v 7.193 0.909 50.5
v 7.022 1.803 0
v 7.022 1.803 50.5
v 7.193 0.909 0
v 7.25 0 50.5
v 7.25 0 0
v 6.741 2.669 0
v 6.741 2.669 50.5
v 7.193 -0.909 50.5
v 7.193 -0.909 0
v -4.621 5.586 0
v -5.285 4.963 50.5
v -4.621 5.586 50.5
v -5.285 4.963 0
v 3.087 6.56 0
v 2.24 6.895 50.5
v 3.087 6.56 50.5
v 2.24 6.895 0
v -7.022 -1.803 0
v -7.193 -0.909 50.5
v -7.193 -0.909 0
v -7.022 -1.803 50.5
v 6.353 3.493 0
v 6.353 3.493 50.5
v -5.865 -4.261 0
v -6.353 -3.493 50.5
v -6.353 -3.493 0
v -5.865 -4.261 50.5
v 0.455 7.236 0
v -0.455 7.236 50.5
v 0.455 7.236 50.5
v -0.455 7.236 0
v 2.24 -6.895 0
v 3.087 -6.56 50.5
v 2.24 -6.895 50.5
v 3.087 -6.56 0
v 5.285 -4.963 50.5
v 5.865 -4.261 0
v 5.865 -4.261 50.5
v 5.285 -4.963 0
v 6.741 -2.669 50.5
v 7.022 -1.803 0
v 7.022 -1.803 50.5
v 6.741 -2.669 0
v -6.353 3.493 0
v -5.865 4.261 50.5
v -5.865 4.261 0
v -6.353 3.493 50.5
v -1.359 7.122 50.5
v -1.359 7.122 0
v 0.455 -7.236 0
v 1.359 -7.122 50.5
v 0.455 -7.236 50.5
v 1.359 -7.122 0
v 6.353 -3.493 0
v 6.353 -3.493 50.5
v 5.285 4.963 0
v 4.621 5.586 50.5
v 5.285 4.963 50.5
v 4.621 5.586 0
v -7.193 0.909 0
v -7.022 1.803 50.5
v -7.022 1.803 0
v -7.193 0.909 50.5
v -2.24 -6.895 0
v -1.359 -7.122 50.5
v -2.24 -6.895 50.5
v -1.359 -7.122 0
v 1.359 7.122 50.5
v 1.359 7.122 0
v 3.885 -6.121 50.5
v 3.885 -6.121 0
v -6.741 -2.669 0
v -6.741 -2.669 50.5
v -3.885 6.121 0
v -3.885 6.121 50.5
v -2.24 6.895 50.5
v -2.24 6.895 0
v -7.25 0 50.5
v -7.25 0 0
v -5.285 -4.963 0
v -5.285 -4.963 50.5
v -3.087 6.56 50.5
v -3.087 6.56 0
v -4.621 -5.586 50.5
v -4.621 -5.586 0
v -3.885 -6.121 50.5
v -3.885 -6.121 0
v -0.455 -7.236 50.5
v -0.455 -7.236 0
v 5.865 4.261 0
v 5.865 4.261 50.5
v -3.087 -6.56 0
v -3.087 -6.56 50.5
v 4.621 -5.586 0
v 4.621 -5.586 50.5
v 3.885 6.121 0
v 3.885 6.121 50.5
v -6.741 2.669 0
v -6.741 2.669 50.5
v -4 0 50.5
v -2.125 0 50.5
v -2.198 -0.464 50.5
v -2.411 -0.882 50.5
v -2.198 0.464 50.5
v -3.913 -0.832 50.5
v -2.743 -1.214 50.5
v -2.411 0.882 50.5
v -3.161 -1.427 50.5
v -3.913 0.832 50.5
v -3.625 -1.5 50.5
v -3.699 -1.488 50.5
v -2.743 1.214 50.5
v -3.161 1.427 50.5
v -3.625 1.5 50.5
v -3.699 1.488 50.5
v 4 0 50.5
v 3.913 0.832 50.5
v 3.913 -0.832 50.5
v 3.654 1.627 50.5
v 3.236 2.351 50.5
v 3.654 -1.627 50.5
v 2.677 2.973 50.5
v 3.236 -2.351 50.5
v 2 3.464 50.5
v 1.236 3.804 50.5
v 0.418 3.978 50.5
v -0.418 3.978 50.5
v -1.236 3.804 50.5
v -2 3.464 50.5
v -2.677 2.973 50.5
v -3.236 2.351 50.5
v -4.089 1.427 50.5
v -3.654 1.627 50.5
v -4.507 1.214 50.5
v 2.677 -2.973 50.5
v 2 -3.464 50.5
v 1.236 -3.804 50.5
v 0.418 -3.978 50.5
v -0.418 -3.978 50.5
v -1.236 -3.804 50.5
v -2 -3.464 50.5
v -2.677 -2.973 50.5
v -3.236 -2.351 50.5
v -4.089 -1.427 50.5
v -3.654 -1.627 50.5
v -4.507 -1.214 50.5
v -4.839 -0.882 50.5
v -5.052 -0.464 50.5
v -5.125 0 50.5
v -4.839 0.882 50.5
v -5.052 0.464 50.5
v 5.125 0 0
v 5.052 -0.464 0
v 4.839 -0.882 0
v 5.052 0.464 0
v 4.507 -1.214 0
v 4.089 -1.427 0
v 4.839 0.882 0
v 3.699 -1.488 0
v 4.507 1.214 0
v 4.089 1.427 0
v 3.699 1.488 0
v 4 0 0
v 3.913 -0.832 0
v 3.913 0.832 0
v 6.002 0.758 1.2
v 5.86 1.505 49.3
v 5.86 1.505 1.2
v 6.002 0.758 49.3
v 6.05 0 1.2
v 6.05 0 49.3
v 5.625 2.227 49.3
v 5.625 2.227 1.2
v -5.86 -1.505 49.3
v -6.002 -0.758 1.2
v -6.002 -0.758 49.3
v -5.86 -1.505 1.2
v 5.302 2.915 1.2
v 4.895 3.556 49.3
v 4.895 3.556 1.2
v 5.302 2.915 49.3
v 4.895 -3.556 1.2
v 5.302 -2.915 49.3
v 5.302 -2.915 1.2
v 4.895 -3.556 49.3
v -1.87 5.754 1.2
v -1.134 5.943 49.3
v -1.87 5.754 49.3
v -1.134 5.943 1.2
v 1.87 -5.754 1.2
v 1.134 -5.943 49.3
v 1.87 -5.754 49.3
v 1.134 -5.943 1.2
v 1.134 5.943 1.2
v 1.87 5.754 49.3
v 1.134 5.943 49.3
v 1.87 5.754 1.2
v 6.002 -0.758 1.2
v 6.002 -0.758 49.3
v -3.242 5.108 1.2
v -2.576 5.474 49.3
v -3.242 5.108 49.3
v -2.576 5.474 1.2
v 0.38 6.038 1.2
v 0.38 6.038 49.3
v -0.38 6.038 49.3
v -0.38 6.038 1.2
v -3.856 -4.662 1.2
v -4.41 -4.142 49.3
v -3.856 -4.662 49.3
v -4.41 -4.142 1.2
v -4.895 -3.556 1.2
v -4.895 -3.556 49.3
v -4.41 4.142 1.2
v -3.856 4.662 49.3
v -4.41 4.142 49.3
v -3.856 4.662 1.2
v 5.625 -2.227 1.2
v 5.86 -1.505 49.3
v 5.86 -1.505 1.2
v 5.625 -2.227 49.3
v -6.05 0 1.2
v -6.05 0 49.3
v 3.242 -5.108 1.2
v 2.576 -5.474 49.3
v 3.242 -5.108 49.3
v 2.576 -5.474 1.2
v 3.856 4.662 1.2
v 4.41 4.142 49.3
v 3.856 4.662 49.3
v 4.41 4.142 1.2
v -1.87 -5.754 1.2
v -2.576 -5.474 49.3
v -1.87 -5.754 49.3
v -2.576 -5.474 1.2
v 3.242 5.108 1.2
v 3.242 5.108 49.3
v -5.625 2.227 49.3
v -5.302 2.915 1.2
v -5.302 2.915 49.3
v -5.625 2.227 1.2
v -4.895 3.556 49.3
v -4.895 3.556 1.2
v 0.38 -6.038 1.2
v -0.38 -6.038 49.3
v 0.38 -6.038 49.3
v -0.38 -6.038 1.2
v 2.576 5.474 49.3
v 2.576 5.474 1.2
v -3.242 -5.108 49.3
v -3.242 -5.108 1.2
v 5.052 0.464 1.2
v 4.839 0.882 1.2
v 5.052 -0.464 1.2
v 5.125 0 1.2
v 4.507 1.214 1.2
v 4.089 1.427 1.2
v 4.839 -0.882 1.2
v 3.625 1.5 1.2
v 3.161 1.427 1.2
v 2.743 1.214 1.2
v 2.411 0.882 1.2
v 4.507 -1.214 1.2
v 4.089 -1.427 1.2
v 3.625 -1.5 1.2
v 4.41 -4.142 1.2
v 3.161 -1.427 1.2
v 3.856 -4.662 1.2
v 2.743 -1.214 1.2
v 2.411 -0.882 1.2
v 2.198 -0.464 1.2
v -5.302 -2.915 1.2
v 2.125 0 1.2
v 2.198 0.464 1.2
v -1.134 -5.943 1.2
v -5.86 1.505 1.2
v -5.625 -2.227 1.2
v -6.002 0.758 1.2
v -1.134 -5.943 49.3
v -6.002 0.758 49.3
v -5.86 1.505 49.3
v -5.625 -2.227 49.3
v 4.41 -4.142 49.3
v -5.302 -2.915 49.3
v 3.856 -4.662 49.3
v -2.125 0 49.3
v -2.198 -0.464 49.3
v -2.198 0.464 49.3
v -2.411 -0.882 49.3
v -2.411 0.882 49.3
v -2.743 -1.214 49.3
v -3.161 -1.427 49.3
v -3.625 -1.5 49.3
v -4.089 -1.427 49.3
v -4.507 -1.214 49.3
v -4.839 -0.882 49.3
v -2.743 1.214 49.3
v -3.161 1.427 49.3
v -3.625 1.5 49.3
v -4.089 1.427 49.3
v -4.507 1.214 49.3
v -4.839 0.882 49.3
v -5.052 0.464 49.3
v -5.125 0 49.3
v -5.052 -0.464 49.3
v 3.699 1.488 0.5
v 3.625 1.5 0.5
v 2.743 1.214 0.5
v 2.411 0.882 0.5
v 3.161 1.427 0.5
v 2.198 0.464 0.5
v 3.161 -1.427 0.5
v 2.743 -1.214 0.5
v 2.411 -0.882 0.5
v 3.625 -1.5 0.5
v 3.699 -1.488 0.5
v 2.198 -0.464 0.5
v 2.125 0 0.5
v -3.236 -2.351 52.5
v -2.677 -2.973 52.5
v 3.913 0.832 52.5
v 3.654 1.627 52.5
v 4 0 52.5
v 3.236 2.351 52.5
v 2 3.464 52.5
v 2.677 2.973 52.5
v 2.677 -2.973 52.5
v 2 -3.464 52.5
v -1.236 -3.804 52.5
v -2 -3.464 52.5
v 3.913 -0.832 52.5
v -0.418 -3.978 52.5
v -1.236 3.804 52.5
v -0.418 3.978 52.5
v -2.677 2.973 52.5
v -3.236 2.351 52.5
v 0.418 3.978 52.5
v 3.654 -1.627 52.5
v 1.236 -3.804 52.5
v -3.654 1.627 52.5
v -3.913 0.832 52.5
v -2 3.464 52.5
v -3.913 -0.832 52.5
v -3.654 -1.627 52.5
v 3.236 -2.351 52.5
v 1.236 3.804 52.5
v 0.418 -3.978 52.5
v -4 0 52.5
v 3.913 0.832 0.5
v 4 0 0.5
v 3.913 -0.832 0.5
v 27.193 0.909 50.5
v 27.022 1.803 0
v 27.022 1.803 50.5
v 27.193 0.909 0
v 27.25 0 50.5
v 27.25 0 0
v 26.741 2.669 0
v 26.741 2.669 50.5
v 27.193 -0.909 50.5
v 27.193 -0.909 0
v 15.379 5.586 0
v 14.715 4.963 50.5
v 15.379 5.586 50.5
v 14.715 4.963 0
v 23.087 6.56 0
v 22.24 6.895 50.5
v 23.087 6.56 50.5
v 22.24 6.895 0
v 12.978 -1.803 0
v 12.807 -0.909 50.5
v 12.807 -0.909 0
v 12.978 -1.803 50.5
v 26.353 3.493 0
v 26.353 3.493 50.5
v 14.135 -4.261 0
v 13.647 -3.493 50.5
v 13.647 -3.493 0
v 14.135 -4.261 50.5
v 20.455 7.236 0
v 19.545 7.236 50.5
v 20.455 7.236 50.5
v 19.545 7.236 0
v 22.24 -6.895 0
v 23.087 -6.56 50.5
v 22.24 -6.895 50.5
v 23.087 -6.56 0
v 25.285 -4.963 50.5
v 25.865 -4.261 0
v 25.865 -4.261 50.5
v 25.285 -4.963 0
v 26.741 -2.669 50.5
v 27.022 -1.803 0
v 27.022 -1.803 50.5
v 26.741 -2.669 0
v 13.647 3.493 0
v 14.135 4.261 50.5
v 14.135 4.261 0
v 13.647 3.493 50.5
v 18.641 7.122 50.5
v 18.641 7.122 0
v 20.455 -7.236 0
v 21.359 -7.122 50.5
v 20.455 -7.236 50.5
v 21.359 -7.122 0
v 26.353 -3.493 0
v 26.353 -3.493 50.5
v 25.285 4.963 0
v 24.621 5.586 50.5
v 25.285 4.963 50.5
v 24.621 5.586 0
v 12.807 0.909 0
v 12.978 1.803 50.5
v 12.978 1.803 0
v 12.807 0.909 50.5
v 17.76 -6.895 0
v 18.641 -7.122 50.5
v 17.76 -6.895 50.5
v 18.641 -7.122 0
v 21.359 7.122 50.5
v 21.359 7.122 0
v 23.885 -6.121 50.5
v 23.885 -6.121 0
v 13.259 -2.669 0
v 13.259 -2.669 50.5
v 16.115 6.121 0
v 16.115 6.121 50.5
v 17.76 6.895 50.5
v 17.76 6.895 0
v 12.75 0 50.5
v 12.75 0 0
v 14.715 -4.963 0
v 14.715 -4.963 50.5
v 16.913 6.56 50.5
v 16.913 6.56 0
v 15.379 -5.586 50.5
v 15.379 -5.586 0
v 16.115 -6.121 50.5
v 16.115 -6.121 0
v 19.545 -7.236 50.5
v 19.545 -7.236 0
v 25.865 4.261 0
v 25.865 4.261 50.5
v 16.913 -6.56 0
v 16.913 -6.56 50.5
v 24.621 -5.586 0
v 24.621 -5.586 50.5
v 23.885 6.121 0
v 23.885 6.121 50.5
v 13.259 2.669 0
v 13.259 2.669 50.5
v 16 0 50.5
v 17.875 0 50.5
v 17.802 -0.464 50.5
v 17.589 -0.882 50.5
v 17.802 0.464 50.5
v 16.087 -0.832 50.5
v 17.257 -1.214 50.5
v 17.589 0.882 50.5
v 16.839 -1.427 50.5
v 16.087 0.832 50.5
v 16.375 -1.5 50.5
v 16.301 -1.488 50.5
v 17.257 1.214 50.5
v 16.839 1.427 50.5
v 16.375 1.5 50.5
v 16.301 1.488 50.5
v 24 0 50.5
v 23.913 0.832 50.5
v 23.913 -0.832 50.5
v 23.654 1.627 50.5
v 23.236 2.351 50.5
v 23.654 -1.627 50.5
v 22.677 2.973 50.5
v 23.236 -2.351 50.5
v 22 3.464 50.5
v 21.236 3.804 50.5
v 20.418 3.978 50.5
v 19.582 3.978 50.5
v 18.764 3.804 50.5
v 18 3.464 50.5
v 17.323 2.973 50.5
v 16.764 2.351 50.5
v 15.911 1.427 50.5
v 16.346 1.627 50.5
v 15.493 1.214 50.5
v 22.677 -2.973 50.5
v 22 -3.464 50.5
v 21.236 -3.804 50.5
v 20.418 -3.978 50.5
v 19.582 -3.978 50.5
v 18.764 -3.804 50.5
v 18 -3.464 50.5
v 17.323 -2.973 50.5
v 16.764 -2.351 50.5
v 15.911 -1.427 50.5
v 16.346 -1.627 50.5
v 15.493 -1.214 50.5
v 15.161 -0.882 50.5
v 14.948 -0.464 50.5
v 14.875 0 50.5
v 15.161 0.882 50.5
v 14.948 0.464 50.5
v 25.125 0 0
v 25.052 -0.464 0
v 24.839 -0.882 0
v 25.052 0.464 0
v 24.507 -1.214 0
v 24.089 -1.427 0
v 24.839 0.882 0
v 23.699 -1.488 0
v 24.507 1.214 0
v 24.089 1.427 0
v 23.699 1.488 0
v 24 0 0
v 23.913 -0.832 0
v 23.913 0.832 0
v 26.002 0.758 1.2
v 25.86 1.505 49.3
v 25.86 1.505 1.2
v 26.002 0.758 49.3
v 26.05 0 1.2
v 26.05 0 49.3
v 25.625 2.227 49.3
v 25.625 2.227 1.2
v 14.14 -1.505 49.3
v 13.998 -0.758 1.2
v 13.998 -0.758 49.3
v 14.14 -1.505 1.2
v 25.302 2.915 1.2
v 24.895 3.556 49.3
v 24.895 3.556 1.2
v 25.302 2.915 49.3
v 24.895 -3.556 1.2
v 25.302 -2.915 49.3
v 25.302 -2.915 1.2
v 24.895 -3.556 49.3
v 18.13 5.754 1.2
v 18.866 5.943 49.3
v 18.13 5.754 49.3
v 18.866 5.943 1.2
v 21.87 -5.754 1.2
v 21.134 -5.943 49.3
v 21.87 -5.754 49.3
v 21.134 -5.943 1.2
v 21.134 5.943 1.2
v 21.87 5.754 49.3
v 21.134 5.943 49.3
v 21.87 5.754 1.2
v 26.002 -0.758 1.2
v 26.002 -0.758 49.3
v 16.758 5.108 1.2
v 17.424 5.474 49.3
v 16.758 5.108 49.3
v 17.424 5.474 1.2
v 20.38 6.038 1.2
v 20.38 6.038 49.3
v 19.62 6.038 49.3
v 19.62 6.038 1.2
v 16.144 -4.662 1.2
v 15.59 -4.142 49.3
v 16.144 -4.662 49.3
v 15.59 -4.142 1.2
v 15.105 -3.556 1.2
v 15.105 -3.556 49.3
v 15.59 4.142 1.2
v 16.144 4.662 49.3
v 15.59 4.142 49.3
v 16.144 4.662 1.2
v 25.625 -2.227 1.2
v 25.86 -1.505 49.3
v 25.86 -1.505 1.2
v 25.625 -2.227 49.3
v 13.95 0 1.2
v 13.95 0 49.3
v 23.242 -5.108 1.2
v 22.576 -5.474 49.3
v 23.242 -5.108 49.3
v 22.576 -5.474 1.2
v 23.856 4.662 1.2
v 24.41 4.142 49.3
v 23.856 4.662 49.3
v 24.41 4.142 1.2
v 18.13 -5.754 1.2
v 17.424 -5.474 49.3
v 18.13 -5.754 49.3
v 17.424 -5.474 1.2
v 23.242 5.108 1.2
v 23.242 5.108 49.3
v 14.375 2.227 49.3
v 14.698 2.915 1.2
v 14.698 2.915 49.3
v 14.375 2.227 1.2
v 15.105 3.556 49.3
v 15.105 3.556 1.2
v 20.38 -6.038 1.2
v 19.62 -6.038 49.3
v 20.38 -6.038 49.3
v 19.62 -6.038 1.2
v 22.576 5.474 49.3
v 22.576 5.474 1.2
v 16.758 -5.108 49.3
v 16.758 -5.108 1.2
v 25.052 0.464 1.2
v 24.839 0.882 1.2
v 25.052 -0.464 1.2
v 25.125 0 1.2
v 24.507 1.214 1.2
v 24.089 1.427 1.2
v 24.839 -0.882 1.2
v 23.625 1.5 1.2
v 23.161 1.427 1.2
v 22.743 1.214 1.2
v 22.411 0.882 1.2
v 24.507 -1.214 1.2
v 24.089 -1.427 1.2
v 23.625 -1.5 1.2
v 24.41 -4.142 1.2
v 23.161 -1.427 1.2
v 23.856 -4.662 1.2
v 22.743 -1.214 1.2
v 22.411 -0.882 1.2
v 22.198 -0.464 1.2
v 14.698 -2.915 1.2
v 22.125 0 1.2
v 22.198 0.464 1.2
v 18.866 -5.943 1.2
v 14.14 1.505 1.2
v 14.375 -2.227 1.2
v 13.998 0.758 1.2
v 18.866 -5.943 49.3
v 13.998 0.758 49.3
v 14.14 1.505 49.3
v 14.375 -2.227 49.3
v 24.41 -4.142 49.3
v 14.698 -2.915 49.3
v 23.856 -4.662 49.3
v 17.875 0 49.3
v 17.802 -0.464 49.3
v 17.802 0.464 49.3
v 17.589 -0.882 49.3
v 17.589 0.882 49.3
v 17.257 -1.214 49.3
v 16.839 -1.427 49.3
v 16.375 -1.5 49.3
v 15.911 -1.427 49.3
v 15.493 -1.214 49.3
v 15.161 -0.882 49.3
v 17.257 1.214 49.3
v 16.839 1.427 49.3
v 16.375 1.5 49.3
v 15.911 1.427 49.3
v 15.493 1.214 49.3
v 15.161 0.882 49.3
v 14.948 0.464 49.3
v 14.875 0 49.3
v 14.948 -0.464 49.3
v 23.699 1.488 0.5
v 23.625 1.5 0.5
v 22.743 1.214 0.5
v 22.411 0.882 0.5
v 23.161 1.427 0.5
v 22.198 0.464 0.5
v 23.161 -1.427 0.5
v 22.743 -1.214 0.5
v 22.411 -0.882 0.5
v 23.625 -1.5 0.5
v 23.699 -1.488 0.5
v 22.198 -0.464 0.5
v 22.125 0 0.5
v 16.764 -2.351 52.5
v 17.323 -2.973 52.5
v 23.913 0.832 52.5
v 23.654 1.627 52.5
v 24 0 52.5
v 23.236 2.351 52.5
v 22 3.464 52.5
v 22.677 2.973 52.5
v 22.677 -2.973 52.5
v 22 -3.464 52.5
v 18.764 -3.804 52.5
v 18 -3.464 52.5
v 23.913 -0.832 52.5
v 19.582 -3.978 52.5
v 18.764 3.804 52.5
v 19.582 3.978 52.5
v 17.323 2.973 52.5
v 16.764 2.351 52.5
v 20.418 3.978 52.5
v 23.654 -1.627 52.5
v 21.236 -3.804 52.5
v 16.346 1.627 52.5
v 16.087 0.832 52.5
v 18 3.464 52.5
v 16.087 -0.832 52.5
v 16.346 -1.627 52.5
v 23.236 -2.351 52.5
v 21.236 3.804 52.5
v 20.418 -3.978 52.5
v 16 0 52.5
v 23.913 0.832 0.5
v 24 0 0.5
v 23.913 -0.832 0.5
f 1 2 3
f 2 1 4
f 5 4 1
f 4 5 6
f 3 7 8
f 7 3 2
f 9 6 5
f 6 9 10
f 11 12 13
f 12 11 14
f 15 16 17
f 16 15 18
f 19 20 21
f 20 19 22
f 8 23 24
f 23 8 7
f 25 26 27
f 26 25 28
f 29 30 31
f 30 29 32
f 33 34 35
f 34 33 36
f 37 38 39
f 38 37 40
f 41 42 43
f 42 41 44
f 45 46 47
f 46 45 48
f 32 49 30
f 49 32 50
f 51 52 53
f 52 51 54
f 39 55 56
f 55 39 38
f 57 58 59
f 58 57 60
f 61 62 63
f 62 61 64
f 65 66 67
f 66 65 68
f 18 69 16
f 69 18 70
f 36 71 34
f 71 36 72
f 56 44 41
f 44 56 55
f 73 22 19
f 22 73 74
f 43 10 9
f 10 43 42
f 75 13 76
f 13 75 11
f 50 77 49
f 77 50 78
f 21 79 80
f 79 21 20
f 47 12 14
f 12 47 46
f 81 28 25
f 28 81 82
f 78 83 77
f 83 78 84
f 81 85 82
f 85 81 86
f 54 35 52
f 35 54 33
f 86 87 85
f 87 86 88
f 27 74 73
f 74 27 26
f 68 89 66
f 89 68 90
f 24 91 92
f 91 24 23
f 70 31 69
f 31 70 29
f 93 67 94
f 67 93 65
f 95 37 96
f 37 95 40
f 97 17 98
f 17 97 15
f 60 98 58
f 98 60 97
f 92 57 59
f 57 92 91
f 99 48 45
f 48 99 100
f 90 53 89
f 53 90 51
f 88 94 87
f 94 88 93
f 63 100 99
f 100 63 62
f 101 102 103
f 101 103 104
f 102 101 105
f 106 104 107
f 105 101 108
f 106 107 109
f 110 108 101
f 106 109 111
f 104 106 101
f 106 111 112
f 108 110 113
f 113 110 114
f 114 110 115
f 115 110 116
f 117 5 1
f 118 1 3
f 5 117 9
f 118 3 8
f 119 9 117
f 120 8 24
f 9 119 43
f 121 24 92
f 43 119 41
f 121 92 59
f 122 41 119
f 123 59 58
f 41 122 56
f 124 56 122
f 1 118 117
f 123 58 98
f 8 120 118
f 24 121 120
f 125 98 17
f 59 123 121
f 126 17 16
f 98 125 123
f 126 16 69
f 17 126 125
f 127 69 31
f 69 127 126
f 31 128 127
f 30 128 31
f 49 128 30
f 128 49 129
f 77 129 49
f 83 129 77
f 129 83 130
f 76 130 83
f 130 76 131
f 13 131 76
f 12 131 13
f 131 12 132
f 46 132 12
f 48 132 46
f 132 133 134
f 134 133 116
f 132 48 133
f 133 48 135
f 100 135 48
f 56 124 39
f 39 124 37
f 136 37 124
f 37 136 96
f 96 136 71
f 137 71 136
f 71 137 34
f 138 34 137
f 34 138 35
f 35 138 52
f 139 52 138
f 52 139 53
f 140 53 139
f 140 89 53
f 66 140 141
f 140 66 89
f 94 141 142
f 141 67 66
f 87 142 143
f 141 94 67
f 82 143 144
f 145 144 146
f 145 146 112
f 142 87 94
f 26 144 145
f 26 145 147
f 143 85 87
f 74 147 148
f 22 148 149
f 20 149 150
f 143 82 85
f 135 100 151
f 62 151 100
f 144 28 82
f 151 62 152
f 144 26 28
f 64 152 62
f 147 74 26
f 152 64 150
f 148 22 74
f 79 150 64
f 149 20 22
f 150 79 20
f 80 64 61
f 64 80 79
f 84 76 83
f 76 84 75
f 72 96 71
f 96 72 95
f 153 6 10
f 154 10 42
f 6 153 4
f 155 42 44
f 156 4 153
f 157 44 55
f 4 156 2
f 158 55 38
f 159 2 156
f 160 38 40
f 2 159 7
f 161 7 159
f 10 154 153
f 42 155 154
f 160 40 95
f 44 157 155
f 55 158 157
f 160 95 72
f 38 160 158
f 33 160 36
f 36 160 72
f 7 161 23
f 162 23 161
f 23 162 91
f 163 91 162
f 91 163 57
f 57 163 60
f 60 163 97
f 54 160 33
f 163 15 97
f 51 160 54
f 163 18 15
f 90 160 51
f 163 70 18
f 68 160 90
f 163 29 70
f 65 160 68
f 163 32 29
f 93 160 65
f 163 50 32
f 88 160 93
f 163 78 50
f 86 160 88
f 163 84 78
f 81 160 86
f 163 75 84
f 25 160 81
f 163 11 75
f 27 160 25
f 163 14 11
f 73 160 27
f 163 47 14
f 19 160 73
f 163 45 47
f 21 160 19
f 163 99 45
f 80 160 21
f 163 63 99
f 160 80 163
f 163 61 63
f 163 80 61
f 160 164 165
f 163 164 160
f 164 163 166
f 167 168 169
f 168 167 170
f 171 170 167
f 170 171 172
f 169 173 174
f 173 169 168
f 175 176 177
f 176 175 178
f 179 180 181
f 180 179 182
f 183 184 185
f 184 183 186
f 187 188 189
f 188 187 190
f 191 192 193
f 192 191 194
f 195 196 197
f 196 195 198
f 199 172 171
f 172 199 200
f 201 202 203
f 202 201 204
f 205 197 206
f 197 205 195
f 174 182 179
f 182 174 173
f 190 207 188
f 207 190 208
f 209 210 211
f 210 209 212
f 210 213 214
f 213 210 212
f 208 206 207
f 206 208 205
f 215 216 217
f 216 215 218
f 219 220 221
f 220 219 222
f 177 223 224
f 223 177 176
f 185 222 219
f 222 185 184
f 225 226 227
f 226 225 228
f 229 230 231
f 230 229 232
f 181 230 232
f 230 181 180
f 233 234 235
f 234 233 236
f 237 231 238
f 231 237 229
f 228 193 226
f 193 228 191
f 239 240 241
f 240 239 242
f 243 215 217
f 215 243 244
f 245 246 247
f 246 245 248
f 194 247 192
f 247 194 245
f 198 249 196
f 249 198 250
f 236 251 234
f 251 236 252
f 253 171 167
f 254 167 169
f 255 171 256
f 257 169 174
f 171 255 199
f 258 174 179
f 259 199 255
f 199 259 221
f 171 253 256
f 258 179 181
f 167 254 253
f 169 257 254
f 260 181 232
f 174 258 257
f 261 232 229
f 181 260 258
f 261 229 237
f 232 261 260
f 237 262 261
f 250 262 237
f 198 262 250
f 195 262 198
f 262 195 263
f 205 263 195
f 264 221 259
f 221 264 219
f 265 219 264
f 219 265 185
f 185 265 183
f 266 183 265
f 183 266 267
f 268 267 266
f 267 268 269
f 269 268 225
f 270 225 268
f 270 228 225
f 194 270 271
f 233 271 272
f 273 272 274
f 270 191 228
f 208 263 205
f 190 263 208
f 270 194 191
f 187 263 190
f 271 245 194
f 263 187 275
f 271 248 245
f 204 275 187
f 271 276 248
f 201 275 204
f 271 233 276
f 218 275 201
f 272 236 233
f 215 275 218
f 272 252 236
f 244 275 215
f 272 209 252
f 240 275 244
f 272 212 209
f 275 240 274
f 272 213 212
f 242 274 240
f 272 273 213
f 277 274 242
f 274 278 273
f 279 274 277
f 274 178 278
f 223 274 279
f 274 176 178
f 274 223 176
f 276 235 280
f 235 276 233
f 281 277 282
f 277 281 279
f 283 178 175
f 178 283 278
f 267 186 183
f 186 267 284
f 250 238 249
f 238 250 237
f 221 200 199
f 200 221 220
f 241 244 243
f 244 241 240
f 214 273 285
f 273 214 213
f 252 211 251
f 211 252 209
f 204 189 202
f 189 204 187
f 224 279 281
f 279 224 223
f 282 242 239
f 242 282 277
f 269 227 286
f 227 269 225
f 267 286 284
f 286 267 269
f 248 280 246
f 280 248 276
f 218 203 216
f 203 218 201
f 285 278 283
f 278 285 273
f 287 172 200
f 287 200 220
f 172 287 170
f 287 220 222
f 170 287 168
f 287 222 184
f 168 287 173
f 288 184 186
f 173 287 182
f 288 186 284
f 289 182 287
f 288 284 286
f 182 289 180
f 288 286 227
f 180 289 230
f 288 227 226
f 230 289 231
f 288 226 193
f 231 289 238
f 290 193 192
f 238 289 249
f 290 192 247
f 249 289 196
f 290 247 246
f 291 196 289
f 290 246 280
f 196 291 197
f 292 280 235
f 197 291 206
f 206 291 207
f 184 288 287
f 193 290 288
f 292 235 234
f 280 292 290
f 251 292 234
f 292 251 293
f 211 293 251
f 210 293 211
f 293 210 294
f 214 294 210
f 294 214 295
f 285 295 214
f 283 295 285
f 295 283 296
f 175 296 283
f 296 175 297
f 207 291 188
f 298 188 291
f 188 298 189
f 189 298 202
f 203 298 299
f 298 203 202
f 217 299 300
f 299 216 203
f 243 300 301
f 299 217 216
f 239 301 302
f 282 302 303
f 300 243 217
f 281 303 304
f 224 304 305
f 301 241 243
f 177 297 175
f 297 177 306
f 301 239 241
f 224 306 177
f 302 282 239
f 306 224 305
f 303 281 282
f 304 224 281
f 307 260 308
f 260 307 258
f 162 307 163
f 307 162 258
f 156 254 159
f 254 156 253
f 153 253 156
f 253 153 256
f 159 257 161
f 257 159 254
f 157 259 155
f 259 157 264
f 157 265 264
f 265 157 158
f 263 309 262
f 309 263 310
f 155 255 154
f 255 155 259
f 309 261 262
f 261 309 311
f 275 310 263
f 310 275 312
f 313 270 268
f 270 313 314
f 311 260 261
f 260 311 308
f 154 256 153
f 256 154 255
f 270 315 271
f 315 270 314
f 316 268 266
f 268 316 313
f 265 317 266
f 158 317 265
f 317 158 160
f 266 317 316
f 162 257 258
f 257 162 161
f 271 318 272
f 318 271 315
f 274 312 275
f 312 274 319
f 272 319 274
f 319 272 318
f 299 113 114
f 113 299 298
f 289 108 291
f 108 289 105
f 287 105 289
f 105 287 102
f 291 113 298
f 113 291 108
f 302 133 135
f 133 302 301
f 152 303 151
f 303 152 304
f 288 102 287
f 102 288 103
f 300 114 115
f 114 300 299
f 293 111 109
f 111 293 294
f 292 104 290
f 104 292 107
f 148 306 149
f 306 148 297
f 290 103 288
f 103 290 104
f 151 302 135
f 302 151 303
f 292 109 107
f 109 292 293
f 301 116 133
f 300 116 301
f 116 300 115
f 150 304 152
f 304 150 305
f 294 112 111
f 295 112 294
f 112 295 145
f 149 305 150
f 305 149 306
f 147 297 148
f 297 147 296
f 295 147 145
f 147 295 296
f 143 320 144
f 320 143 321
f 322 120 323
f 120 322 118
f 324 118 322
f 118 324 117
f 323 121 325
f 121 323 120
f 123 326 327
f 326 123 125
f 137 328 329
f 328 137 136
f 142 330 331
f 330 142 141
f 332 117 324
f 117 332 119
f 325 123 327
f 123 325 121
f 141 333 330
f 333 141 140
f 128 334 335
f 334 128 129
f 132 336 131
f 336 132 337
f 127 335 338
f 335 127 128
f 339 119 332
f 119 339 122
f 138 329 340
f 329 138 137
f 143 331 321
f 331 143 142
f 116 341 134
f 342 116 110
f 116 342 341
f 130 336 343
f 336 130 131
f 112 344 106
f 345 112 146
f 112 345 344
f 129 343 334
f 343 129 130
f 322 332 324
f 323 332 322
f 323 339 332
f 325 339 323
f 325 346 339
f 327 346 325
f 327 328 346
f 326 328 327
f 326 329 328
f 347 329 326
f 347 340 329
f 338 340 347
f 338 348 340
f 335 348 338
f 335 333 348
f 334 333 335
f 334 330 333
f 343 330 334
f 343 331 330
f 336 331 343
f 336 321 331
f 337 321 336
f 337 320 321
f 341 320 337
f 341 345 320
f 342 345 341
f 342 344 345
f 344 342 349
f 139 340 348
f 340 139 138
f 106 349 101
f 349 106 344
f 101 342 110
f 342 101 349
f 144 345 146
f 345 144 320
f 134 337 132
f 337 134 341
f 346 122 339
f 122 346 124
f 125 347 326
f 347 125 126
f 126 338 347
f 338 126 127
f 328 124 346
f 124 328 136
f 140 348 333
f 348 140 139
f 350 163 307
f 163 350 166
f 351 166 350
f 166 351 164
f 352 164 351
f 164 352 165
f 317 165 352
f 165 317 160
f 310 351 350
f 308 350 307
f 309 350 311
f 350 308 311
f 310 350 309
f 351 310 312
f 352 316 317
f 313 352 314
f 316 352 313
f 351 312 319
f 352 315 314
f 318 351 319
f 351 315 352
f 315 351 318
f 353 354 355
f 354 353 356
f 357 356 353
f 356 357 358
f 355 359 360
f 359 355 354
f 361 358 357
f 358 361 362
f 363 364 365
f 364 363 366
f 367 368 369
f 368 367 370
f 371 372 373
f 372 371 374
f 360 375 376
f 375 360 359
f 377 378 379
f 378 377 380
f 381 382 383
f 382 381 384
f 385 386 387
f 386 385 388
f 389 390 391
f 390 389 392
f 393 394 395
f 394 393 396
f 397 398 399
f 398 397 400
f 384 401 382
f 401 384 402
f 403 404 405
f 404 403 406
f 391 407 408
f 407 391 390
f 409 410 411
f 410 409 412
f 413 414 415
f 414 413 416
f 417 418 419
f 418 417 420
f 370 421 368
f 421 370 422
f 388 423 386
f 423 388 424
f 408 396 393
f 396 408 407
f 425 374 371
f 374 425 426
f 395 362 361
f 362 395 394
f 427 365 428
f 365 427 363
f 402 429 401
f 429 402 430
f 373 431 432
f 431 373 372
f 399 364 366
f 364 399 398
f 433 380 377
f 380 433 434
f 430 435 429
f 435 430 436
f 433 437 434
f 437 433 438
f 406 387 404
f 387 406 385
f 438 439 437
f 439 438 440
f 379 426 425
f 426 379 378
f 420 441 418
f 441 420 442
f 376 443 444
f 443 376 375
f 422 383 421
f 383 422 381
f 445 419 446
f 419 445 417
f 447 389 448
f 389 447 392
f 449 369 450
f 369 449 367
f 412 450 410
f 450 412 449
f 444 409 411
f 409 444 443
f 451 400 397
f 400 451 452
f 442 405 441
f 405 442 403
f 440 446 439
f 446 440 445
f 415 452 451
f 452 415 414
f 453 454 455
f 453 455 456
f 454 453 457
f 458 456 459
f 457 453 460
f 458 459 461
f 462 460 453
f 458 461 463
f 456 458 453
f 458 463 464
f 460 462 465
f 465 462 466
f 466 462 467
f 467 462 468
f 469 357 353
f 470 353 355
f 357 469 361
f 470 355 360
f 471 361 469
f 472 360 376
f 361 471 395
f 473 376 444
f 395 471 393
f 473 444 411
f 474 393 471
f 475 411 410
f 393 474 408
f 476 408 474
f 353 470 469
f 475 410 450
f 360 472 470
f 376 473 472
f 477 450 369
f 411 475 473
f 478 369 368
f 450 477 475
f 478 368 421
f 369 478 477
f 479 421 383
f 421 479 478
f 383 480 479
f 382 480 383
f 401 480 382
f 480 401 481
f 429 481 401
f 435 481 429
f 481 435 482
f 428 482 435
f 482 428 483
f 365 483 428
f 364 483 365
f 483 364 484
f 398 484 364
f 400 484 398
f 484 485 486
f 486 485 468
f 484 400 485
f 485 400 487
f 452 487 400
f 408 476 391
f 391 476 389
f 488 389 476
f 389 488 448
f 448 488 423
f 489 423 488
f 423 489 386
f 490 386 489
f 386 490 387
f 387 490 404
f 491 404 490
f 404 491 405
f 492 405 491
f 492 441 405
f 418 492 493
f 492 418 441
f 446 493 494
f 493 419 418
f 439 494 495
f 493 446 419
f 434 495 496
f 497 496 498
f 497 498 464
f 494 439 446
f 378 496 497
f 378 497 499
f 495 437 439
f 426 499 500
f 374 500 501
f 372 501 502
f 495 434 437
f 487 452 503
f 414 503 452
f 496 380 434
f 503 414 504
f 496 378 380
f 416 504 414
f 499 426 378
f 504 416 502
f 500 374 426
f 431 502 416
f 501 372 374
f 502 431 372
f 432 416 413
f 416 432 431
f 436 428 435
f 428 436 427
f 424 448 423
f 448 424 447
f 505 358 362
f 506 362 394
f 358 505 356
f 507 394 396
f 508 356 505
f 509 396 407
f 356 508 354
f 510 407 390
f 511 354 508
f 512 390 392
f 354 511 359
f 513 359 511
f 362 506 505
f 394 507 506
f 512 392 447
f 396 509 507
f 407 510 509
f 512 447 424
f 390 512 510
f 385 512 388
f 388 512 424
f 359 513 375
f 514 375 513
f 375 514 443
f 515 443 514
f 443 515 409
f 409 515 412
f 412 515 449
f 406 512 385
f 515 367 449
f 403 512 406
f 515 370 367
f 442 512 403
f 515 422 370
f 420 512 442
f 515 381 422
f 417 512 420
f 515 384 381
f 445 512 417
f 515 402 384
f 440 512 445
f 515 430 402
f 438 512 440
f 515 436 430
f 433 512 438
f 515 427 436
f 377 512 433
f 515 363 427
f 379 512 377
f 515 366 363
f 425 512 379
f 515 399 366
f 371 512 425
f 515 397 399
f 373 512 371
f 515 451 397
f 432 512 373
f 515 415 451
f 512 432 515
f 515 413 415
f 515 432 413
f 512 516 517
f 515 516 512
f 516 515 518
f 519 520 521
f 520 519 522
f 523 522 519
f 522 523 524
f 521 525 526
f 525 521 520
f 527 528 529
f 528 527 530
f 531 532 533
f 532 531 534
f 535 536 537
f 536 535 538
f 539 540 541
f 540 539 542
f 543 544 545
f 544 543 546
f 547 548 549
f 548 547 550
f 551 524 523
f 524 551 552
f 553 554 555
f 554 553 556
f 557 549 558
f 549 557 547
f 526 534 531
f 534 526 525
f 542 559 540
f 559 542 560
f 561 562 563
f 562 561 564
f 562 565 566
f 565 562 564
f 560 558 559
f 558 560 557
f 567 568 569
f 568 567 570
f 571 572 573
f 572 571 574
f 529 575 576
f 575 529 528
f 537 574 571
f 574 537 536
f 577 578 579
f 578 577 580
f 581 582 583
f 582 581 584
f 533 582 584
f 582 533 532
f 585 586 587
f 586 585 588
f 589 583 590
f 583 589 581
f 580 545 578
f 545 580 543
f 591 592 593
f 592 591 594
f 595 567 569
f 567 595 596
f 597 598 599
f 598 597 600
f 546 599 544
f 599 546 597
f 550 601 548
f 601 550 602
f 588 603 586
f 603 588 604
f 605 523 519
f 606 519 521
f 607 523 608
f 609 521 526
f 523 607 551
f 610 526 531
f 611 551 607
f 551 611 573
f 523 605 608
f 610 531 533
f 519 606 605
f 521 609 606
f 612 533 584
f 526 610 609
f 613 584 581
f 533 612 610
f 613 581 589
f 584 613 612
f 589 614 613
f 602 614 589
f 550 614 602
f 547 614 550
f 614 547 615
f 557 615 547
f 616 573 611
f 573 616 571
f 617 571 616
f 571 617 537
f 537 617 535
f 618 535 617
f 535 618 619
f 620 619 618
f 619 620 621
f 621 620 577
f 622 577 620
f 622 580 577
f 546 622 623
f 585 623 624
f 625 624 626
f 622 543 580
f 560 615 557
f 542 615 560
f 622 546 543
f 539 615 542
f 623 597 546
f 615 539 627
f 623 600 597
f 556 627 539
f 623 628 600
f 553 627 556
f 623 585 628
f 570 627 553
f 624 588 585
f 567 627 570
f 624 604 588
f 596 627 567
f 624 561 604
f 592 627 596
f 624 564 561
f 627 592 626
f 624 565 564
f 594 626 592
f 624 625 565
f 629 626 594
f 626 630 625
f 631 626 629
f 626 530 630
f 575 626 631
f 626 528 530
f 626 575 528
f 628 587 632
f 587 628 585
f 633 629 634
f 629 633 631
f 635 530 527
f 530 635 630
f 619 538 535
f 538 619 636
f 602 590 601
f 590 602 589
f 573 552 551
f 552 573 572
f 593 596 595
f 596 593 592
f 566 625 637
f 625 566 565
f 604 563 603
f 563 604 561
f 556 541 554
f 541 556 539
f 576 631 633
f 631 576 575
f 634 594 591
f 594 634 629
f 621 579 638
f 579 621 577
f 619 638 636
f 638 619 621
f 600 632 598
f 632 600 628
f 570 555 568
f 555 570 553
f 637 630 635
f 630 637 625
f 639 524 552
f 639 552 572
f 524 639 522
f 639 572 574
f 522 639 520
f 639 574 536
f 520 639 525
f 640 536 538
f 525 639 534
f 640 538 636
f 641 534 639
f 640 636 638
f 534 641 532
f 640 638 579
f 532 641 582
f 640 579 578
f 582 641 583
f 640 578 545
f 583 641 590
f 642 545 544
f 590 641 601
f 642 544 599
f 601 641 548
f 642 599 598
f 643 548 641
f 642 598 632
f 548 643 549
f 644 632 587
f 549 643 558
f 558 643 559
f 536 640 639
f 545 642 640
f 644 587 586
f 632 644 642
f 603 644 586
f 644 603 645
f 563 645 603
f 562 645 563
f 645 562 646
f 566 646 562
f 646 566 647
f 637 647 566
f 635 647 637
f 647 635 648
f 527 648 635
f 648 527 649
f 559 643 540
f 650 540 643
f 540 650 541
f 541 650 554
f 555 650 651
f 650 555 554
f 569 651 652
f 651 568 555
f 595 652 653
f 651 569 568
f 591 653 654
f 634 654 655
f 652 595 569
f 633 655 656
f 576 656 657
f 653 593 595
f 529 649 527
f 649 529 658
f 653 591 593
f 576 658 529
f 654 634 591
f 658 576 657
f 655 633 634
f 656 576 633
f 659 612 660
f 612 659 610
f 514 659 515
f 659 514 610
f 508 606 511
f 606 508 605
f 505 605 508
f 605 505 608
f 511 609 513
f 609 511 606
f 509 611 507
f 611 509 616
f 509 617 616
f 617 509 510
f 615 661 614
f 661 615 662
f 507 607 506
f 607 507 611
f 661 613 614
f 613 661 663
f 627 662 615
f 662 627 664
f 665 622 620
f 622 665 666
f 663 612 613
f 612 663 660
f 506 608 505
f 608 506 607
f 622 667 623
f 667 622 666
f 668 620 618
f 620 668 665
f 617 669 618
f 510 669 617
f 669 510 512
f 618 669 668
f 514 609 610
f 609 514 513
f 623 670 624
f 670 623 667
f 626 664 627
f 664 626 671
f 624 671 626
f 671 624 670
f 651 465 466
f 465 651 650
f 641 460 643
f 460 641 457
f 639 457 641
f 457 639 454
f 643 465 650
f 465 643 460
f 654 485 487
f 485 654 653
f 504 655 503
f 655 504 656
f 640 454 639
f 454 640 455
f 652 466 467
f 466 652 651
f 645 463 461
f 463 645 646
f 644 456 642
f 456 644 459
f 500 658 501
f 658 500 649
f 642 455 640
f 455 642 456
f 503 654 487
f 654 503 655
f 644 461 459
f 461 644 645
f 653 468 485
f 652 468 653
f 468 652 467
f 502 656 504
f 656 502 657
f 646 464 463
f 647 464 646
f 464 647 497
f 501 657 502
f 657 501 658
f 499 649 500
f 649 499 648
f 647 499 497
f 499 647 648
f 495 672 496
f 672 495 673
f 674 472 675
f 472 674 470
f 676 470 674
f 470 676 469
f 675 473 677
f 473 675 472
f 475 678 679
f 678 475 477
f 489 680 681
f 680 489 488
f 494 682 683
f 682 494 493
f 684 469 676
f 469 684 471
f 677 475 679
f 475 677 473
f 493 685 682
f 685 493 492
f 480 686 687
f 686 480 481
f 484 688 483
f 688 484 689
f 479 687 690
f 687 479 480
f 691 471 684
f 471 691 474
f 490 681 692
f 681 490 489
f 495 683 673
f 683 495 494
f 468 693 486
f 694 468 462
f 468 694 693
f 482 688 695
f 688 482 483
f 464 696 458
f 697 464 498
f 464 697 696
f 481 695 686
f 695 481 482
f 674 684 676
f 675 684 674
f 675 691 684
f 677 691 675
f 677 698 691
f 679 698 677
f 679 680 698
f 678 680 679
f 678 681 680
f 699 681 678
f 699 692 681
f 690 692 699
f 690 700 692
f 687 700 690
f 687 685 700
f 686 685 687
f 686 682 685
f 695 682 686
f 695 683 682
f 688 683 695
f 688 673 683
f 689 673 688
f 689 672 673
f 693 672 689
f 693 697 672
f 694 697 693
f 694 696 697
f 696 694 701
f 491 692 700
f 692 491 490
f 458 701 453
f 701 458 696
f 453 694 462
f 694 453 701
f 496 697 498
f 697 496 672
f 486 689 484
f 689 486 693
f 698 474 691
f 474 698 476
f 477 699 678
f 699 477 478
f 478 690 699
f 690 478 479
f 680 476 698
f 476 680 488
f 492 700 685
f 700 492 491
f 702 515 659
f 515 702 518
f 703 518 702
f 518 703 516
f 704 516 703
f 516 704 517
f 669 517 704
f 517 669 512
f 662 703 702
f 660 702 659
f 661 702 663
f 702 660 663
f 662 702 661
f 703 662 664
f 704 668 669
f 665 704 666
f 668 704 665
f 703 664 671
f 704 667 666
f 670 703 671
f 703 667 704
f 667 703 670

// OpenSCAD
// VR AA Battery Replacer
// 3D printable replacement for AA batteries to reduce VR controller weight
//
// This creates a hollow cylindrical shell that fits in place of an AA battery
// with openings for wire connections to external batteries

// AA battery dimensions (standard)
battery_length = 50.5;  // mm
battery_diameter = 14.5; // mm

// Wall thickness for the printed part
wall_thickness = 1.2;   // mm (recommended for strength)

// Wire hole diameter
wire_hole_diameter = 3.0; // mm (for typical wire gauges)

// Contact dimensions
contact_height = 2.0;   // mm
contact_diameter = 8.0; // mm

module aa_battery_replacer() {
    difference() {
        // Main cylindrical body
        cylinder(h = battery_length, d = battery_diameter, center = false, $fn = 50);
        
        // Hollow out the interior (leaving walls)
        translate([0, 0, wall_thickness])
        cylinder(h = battery_length - 2 * wall_thickness, 
                d = battery_diameter - 2 * wall_thickness, 
                center = false, $fn = 50);
        
        // Wire hole at one end (negative terminal side)
        translate([battery_diameter/4, 0, wall_thickness/2])
        cylinder(h = wall_thickness * 2, d = wire_hole_diameter, center = true, $fn = 20);
        
        // Wire hole at other end (positive terminal side)
        translate([-battery_diameter/4, 0, battery_length - wall_thickness/2])
        cylinder(h = wall_thickness * 2, d = wire_hole_diameter, center = true, $fn = 20);
    }
    
    // Positive terminal contact (raised button)
    translate([0, 0, battery_length])
    cylinder(h = contact_height, d = contact_diameter, center = false, $fn = 30);
    
    // Negative terminal contact (flat with small raised ring)
    cylinder(h = 0.5, d = contact_diameter, center = false, $fn = 30);
}

// Create the part
aa_battery_replacer();

// Optional: Create a second part for dual battery controllers
translate([20, 0, 0])
aa_battery_replacer();
